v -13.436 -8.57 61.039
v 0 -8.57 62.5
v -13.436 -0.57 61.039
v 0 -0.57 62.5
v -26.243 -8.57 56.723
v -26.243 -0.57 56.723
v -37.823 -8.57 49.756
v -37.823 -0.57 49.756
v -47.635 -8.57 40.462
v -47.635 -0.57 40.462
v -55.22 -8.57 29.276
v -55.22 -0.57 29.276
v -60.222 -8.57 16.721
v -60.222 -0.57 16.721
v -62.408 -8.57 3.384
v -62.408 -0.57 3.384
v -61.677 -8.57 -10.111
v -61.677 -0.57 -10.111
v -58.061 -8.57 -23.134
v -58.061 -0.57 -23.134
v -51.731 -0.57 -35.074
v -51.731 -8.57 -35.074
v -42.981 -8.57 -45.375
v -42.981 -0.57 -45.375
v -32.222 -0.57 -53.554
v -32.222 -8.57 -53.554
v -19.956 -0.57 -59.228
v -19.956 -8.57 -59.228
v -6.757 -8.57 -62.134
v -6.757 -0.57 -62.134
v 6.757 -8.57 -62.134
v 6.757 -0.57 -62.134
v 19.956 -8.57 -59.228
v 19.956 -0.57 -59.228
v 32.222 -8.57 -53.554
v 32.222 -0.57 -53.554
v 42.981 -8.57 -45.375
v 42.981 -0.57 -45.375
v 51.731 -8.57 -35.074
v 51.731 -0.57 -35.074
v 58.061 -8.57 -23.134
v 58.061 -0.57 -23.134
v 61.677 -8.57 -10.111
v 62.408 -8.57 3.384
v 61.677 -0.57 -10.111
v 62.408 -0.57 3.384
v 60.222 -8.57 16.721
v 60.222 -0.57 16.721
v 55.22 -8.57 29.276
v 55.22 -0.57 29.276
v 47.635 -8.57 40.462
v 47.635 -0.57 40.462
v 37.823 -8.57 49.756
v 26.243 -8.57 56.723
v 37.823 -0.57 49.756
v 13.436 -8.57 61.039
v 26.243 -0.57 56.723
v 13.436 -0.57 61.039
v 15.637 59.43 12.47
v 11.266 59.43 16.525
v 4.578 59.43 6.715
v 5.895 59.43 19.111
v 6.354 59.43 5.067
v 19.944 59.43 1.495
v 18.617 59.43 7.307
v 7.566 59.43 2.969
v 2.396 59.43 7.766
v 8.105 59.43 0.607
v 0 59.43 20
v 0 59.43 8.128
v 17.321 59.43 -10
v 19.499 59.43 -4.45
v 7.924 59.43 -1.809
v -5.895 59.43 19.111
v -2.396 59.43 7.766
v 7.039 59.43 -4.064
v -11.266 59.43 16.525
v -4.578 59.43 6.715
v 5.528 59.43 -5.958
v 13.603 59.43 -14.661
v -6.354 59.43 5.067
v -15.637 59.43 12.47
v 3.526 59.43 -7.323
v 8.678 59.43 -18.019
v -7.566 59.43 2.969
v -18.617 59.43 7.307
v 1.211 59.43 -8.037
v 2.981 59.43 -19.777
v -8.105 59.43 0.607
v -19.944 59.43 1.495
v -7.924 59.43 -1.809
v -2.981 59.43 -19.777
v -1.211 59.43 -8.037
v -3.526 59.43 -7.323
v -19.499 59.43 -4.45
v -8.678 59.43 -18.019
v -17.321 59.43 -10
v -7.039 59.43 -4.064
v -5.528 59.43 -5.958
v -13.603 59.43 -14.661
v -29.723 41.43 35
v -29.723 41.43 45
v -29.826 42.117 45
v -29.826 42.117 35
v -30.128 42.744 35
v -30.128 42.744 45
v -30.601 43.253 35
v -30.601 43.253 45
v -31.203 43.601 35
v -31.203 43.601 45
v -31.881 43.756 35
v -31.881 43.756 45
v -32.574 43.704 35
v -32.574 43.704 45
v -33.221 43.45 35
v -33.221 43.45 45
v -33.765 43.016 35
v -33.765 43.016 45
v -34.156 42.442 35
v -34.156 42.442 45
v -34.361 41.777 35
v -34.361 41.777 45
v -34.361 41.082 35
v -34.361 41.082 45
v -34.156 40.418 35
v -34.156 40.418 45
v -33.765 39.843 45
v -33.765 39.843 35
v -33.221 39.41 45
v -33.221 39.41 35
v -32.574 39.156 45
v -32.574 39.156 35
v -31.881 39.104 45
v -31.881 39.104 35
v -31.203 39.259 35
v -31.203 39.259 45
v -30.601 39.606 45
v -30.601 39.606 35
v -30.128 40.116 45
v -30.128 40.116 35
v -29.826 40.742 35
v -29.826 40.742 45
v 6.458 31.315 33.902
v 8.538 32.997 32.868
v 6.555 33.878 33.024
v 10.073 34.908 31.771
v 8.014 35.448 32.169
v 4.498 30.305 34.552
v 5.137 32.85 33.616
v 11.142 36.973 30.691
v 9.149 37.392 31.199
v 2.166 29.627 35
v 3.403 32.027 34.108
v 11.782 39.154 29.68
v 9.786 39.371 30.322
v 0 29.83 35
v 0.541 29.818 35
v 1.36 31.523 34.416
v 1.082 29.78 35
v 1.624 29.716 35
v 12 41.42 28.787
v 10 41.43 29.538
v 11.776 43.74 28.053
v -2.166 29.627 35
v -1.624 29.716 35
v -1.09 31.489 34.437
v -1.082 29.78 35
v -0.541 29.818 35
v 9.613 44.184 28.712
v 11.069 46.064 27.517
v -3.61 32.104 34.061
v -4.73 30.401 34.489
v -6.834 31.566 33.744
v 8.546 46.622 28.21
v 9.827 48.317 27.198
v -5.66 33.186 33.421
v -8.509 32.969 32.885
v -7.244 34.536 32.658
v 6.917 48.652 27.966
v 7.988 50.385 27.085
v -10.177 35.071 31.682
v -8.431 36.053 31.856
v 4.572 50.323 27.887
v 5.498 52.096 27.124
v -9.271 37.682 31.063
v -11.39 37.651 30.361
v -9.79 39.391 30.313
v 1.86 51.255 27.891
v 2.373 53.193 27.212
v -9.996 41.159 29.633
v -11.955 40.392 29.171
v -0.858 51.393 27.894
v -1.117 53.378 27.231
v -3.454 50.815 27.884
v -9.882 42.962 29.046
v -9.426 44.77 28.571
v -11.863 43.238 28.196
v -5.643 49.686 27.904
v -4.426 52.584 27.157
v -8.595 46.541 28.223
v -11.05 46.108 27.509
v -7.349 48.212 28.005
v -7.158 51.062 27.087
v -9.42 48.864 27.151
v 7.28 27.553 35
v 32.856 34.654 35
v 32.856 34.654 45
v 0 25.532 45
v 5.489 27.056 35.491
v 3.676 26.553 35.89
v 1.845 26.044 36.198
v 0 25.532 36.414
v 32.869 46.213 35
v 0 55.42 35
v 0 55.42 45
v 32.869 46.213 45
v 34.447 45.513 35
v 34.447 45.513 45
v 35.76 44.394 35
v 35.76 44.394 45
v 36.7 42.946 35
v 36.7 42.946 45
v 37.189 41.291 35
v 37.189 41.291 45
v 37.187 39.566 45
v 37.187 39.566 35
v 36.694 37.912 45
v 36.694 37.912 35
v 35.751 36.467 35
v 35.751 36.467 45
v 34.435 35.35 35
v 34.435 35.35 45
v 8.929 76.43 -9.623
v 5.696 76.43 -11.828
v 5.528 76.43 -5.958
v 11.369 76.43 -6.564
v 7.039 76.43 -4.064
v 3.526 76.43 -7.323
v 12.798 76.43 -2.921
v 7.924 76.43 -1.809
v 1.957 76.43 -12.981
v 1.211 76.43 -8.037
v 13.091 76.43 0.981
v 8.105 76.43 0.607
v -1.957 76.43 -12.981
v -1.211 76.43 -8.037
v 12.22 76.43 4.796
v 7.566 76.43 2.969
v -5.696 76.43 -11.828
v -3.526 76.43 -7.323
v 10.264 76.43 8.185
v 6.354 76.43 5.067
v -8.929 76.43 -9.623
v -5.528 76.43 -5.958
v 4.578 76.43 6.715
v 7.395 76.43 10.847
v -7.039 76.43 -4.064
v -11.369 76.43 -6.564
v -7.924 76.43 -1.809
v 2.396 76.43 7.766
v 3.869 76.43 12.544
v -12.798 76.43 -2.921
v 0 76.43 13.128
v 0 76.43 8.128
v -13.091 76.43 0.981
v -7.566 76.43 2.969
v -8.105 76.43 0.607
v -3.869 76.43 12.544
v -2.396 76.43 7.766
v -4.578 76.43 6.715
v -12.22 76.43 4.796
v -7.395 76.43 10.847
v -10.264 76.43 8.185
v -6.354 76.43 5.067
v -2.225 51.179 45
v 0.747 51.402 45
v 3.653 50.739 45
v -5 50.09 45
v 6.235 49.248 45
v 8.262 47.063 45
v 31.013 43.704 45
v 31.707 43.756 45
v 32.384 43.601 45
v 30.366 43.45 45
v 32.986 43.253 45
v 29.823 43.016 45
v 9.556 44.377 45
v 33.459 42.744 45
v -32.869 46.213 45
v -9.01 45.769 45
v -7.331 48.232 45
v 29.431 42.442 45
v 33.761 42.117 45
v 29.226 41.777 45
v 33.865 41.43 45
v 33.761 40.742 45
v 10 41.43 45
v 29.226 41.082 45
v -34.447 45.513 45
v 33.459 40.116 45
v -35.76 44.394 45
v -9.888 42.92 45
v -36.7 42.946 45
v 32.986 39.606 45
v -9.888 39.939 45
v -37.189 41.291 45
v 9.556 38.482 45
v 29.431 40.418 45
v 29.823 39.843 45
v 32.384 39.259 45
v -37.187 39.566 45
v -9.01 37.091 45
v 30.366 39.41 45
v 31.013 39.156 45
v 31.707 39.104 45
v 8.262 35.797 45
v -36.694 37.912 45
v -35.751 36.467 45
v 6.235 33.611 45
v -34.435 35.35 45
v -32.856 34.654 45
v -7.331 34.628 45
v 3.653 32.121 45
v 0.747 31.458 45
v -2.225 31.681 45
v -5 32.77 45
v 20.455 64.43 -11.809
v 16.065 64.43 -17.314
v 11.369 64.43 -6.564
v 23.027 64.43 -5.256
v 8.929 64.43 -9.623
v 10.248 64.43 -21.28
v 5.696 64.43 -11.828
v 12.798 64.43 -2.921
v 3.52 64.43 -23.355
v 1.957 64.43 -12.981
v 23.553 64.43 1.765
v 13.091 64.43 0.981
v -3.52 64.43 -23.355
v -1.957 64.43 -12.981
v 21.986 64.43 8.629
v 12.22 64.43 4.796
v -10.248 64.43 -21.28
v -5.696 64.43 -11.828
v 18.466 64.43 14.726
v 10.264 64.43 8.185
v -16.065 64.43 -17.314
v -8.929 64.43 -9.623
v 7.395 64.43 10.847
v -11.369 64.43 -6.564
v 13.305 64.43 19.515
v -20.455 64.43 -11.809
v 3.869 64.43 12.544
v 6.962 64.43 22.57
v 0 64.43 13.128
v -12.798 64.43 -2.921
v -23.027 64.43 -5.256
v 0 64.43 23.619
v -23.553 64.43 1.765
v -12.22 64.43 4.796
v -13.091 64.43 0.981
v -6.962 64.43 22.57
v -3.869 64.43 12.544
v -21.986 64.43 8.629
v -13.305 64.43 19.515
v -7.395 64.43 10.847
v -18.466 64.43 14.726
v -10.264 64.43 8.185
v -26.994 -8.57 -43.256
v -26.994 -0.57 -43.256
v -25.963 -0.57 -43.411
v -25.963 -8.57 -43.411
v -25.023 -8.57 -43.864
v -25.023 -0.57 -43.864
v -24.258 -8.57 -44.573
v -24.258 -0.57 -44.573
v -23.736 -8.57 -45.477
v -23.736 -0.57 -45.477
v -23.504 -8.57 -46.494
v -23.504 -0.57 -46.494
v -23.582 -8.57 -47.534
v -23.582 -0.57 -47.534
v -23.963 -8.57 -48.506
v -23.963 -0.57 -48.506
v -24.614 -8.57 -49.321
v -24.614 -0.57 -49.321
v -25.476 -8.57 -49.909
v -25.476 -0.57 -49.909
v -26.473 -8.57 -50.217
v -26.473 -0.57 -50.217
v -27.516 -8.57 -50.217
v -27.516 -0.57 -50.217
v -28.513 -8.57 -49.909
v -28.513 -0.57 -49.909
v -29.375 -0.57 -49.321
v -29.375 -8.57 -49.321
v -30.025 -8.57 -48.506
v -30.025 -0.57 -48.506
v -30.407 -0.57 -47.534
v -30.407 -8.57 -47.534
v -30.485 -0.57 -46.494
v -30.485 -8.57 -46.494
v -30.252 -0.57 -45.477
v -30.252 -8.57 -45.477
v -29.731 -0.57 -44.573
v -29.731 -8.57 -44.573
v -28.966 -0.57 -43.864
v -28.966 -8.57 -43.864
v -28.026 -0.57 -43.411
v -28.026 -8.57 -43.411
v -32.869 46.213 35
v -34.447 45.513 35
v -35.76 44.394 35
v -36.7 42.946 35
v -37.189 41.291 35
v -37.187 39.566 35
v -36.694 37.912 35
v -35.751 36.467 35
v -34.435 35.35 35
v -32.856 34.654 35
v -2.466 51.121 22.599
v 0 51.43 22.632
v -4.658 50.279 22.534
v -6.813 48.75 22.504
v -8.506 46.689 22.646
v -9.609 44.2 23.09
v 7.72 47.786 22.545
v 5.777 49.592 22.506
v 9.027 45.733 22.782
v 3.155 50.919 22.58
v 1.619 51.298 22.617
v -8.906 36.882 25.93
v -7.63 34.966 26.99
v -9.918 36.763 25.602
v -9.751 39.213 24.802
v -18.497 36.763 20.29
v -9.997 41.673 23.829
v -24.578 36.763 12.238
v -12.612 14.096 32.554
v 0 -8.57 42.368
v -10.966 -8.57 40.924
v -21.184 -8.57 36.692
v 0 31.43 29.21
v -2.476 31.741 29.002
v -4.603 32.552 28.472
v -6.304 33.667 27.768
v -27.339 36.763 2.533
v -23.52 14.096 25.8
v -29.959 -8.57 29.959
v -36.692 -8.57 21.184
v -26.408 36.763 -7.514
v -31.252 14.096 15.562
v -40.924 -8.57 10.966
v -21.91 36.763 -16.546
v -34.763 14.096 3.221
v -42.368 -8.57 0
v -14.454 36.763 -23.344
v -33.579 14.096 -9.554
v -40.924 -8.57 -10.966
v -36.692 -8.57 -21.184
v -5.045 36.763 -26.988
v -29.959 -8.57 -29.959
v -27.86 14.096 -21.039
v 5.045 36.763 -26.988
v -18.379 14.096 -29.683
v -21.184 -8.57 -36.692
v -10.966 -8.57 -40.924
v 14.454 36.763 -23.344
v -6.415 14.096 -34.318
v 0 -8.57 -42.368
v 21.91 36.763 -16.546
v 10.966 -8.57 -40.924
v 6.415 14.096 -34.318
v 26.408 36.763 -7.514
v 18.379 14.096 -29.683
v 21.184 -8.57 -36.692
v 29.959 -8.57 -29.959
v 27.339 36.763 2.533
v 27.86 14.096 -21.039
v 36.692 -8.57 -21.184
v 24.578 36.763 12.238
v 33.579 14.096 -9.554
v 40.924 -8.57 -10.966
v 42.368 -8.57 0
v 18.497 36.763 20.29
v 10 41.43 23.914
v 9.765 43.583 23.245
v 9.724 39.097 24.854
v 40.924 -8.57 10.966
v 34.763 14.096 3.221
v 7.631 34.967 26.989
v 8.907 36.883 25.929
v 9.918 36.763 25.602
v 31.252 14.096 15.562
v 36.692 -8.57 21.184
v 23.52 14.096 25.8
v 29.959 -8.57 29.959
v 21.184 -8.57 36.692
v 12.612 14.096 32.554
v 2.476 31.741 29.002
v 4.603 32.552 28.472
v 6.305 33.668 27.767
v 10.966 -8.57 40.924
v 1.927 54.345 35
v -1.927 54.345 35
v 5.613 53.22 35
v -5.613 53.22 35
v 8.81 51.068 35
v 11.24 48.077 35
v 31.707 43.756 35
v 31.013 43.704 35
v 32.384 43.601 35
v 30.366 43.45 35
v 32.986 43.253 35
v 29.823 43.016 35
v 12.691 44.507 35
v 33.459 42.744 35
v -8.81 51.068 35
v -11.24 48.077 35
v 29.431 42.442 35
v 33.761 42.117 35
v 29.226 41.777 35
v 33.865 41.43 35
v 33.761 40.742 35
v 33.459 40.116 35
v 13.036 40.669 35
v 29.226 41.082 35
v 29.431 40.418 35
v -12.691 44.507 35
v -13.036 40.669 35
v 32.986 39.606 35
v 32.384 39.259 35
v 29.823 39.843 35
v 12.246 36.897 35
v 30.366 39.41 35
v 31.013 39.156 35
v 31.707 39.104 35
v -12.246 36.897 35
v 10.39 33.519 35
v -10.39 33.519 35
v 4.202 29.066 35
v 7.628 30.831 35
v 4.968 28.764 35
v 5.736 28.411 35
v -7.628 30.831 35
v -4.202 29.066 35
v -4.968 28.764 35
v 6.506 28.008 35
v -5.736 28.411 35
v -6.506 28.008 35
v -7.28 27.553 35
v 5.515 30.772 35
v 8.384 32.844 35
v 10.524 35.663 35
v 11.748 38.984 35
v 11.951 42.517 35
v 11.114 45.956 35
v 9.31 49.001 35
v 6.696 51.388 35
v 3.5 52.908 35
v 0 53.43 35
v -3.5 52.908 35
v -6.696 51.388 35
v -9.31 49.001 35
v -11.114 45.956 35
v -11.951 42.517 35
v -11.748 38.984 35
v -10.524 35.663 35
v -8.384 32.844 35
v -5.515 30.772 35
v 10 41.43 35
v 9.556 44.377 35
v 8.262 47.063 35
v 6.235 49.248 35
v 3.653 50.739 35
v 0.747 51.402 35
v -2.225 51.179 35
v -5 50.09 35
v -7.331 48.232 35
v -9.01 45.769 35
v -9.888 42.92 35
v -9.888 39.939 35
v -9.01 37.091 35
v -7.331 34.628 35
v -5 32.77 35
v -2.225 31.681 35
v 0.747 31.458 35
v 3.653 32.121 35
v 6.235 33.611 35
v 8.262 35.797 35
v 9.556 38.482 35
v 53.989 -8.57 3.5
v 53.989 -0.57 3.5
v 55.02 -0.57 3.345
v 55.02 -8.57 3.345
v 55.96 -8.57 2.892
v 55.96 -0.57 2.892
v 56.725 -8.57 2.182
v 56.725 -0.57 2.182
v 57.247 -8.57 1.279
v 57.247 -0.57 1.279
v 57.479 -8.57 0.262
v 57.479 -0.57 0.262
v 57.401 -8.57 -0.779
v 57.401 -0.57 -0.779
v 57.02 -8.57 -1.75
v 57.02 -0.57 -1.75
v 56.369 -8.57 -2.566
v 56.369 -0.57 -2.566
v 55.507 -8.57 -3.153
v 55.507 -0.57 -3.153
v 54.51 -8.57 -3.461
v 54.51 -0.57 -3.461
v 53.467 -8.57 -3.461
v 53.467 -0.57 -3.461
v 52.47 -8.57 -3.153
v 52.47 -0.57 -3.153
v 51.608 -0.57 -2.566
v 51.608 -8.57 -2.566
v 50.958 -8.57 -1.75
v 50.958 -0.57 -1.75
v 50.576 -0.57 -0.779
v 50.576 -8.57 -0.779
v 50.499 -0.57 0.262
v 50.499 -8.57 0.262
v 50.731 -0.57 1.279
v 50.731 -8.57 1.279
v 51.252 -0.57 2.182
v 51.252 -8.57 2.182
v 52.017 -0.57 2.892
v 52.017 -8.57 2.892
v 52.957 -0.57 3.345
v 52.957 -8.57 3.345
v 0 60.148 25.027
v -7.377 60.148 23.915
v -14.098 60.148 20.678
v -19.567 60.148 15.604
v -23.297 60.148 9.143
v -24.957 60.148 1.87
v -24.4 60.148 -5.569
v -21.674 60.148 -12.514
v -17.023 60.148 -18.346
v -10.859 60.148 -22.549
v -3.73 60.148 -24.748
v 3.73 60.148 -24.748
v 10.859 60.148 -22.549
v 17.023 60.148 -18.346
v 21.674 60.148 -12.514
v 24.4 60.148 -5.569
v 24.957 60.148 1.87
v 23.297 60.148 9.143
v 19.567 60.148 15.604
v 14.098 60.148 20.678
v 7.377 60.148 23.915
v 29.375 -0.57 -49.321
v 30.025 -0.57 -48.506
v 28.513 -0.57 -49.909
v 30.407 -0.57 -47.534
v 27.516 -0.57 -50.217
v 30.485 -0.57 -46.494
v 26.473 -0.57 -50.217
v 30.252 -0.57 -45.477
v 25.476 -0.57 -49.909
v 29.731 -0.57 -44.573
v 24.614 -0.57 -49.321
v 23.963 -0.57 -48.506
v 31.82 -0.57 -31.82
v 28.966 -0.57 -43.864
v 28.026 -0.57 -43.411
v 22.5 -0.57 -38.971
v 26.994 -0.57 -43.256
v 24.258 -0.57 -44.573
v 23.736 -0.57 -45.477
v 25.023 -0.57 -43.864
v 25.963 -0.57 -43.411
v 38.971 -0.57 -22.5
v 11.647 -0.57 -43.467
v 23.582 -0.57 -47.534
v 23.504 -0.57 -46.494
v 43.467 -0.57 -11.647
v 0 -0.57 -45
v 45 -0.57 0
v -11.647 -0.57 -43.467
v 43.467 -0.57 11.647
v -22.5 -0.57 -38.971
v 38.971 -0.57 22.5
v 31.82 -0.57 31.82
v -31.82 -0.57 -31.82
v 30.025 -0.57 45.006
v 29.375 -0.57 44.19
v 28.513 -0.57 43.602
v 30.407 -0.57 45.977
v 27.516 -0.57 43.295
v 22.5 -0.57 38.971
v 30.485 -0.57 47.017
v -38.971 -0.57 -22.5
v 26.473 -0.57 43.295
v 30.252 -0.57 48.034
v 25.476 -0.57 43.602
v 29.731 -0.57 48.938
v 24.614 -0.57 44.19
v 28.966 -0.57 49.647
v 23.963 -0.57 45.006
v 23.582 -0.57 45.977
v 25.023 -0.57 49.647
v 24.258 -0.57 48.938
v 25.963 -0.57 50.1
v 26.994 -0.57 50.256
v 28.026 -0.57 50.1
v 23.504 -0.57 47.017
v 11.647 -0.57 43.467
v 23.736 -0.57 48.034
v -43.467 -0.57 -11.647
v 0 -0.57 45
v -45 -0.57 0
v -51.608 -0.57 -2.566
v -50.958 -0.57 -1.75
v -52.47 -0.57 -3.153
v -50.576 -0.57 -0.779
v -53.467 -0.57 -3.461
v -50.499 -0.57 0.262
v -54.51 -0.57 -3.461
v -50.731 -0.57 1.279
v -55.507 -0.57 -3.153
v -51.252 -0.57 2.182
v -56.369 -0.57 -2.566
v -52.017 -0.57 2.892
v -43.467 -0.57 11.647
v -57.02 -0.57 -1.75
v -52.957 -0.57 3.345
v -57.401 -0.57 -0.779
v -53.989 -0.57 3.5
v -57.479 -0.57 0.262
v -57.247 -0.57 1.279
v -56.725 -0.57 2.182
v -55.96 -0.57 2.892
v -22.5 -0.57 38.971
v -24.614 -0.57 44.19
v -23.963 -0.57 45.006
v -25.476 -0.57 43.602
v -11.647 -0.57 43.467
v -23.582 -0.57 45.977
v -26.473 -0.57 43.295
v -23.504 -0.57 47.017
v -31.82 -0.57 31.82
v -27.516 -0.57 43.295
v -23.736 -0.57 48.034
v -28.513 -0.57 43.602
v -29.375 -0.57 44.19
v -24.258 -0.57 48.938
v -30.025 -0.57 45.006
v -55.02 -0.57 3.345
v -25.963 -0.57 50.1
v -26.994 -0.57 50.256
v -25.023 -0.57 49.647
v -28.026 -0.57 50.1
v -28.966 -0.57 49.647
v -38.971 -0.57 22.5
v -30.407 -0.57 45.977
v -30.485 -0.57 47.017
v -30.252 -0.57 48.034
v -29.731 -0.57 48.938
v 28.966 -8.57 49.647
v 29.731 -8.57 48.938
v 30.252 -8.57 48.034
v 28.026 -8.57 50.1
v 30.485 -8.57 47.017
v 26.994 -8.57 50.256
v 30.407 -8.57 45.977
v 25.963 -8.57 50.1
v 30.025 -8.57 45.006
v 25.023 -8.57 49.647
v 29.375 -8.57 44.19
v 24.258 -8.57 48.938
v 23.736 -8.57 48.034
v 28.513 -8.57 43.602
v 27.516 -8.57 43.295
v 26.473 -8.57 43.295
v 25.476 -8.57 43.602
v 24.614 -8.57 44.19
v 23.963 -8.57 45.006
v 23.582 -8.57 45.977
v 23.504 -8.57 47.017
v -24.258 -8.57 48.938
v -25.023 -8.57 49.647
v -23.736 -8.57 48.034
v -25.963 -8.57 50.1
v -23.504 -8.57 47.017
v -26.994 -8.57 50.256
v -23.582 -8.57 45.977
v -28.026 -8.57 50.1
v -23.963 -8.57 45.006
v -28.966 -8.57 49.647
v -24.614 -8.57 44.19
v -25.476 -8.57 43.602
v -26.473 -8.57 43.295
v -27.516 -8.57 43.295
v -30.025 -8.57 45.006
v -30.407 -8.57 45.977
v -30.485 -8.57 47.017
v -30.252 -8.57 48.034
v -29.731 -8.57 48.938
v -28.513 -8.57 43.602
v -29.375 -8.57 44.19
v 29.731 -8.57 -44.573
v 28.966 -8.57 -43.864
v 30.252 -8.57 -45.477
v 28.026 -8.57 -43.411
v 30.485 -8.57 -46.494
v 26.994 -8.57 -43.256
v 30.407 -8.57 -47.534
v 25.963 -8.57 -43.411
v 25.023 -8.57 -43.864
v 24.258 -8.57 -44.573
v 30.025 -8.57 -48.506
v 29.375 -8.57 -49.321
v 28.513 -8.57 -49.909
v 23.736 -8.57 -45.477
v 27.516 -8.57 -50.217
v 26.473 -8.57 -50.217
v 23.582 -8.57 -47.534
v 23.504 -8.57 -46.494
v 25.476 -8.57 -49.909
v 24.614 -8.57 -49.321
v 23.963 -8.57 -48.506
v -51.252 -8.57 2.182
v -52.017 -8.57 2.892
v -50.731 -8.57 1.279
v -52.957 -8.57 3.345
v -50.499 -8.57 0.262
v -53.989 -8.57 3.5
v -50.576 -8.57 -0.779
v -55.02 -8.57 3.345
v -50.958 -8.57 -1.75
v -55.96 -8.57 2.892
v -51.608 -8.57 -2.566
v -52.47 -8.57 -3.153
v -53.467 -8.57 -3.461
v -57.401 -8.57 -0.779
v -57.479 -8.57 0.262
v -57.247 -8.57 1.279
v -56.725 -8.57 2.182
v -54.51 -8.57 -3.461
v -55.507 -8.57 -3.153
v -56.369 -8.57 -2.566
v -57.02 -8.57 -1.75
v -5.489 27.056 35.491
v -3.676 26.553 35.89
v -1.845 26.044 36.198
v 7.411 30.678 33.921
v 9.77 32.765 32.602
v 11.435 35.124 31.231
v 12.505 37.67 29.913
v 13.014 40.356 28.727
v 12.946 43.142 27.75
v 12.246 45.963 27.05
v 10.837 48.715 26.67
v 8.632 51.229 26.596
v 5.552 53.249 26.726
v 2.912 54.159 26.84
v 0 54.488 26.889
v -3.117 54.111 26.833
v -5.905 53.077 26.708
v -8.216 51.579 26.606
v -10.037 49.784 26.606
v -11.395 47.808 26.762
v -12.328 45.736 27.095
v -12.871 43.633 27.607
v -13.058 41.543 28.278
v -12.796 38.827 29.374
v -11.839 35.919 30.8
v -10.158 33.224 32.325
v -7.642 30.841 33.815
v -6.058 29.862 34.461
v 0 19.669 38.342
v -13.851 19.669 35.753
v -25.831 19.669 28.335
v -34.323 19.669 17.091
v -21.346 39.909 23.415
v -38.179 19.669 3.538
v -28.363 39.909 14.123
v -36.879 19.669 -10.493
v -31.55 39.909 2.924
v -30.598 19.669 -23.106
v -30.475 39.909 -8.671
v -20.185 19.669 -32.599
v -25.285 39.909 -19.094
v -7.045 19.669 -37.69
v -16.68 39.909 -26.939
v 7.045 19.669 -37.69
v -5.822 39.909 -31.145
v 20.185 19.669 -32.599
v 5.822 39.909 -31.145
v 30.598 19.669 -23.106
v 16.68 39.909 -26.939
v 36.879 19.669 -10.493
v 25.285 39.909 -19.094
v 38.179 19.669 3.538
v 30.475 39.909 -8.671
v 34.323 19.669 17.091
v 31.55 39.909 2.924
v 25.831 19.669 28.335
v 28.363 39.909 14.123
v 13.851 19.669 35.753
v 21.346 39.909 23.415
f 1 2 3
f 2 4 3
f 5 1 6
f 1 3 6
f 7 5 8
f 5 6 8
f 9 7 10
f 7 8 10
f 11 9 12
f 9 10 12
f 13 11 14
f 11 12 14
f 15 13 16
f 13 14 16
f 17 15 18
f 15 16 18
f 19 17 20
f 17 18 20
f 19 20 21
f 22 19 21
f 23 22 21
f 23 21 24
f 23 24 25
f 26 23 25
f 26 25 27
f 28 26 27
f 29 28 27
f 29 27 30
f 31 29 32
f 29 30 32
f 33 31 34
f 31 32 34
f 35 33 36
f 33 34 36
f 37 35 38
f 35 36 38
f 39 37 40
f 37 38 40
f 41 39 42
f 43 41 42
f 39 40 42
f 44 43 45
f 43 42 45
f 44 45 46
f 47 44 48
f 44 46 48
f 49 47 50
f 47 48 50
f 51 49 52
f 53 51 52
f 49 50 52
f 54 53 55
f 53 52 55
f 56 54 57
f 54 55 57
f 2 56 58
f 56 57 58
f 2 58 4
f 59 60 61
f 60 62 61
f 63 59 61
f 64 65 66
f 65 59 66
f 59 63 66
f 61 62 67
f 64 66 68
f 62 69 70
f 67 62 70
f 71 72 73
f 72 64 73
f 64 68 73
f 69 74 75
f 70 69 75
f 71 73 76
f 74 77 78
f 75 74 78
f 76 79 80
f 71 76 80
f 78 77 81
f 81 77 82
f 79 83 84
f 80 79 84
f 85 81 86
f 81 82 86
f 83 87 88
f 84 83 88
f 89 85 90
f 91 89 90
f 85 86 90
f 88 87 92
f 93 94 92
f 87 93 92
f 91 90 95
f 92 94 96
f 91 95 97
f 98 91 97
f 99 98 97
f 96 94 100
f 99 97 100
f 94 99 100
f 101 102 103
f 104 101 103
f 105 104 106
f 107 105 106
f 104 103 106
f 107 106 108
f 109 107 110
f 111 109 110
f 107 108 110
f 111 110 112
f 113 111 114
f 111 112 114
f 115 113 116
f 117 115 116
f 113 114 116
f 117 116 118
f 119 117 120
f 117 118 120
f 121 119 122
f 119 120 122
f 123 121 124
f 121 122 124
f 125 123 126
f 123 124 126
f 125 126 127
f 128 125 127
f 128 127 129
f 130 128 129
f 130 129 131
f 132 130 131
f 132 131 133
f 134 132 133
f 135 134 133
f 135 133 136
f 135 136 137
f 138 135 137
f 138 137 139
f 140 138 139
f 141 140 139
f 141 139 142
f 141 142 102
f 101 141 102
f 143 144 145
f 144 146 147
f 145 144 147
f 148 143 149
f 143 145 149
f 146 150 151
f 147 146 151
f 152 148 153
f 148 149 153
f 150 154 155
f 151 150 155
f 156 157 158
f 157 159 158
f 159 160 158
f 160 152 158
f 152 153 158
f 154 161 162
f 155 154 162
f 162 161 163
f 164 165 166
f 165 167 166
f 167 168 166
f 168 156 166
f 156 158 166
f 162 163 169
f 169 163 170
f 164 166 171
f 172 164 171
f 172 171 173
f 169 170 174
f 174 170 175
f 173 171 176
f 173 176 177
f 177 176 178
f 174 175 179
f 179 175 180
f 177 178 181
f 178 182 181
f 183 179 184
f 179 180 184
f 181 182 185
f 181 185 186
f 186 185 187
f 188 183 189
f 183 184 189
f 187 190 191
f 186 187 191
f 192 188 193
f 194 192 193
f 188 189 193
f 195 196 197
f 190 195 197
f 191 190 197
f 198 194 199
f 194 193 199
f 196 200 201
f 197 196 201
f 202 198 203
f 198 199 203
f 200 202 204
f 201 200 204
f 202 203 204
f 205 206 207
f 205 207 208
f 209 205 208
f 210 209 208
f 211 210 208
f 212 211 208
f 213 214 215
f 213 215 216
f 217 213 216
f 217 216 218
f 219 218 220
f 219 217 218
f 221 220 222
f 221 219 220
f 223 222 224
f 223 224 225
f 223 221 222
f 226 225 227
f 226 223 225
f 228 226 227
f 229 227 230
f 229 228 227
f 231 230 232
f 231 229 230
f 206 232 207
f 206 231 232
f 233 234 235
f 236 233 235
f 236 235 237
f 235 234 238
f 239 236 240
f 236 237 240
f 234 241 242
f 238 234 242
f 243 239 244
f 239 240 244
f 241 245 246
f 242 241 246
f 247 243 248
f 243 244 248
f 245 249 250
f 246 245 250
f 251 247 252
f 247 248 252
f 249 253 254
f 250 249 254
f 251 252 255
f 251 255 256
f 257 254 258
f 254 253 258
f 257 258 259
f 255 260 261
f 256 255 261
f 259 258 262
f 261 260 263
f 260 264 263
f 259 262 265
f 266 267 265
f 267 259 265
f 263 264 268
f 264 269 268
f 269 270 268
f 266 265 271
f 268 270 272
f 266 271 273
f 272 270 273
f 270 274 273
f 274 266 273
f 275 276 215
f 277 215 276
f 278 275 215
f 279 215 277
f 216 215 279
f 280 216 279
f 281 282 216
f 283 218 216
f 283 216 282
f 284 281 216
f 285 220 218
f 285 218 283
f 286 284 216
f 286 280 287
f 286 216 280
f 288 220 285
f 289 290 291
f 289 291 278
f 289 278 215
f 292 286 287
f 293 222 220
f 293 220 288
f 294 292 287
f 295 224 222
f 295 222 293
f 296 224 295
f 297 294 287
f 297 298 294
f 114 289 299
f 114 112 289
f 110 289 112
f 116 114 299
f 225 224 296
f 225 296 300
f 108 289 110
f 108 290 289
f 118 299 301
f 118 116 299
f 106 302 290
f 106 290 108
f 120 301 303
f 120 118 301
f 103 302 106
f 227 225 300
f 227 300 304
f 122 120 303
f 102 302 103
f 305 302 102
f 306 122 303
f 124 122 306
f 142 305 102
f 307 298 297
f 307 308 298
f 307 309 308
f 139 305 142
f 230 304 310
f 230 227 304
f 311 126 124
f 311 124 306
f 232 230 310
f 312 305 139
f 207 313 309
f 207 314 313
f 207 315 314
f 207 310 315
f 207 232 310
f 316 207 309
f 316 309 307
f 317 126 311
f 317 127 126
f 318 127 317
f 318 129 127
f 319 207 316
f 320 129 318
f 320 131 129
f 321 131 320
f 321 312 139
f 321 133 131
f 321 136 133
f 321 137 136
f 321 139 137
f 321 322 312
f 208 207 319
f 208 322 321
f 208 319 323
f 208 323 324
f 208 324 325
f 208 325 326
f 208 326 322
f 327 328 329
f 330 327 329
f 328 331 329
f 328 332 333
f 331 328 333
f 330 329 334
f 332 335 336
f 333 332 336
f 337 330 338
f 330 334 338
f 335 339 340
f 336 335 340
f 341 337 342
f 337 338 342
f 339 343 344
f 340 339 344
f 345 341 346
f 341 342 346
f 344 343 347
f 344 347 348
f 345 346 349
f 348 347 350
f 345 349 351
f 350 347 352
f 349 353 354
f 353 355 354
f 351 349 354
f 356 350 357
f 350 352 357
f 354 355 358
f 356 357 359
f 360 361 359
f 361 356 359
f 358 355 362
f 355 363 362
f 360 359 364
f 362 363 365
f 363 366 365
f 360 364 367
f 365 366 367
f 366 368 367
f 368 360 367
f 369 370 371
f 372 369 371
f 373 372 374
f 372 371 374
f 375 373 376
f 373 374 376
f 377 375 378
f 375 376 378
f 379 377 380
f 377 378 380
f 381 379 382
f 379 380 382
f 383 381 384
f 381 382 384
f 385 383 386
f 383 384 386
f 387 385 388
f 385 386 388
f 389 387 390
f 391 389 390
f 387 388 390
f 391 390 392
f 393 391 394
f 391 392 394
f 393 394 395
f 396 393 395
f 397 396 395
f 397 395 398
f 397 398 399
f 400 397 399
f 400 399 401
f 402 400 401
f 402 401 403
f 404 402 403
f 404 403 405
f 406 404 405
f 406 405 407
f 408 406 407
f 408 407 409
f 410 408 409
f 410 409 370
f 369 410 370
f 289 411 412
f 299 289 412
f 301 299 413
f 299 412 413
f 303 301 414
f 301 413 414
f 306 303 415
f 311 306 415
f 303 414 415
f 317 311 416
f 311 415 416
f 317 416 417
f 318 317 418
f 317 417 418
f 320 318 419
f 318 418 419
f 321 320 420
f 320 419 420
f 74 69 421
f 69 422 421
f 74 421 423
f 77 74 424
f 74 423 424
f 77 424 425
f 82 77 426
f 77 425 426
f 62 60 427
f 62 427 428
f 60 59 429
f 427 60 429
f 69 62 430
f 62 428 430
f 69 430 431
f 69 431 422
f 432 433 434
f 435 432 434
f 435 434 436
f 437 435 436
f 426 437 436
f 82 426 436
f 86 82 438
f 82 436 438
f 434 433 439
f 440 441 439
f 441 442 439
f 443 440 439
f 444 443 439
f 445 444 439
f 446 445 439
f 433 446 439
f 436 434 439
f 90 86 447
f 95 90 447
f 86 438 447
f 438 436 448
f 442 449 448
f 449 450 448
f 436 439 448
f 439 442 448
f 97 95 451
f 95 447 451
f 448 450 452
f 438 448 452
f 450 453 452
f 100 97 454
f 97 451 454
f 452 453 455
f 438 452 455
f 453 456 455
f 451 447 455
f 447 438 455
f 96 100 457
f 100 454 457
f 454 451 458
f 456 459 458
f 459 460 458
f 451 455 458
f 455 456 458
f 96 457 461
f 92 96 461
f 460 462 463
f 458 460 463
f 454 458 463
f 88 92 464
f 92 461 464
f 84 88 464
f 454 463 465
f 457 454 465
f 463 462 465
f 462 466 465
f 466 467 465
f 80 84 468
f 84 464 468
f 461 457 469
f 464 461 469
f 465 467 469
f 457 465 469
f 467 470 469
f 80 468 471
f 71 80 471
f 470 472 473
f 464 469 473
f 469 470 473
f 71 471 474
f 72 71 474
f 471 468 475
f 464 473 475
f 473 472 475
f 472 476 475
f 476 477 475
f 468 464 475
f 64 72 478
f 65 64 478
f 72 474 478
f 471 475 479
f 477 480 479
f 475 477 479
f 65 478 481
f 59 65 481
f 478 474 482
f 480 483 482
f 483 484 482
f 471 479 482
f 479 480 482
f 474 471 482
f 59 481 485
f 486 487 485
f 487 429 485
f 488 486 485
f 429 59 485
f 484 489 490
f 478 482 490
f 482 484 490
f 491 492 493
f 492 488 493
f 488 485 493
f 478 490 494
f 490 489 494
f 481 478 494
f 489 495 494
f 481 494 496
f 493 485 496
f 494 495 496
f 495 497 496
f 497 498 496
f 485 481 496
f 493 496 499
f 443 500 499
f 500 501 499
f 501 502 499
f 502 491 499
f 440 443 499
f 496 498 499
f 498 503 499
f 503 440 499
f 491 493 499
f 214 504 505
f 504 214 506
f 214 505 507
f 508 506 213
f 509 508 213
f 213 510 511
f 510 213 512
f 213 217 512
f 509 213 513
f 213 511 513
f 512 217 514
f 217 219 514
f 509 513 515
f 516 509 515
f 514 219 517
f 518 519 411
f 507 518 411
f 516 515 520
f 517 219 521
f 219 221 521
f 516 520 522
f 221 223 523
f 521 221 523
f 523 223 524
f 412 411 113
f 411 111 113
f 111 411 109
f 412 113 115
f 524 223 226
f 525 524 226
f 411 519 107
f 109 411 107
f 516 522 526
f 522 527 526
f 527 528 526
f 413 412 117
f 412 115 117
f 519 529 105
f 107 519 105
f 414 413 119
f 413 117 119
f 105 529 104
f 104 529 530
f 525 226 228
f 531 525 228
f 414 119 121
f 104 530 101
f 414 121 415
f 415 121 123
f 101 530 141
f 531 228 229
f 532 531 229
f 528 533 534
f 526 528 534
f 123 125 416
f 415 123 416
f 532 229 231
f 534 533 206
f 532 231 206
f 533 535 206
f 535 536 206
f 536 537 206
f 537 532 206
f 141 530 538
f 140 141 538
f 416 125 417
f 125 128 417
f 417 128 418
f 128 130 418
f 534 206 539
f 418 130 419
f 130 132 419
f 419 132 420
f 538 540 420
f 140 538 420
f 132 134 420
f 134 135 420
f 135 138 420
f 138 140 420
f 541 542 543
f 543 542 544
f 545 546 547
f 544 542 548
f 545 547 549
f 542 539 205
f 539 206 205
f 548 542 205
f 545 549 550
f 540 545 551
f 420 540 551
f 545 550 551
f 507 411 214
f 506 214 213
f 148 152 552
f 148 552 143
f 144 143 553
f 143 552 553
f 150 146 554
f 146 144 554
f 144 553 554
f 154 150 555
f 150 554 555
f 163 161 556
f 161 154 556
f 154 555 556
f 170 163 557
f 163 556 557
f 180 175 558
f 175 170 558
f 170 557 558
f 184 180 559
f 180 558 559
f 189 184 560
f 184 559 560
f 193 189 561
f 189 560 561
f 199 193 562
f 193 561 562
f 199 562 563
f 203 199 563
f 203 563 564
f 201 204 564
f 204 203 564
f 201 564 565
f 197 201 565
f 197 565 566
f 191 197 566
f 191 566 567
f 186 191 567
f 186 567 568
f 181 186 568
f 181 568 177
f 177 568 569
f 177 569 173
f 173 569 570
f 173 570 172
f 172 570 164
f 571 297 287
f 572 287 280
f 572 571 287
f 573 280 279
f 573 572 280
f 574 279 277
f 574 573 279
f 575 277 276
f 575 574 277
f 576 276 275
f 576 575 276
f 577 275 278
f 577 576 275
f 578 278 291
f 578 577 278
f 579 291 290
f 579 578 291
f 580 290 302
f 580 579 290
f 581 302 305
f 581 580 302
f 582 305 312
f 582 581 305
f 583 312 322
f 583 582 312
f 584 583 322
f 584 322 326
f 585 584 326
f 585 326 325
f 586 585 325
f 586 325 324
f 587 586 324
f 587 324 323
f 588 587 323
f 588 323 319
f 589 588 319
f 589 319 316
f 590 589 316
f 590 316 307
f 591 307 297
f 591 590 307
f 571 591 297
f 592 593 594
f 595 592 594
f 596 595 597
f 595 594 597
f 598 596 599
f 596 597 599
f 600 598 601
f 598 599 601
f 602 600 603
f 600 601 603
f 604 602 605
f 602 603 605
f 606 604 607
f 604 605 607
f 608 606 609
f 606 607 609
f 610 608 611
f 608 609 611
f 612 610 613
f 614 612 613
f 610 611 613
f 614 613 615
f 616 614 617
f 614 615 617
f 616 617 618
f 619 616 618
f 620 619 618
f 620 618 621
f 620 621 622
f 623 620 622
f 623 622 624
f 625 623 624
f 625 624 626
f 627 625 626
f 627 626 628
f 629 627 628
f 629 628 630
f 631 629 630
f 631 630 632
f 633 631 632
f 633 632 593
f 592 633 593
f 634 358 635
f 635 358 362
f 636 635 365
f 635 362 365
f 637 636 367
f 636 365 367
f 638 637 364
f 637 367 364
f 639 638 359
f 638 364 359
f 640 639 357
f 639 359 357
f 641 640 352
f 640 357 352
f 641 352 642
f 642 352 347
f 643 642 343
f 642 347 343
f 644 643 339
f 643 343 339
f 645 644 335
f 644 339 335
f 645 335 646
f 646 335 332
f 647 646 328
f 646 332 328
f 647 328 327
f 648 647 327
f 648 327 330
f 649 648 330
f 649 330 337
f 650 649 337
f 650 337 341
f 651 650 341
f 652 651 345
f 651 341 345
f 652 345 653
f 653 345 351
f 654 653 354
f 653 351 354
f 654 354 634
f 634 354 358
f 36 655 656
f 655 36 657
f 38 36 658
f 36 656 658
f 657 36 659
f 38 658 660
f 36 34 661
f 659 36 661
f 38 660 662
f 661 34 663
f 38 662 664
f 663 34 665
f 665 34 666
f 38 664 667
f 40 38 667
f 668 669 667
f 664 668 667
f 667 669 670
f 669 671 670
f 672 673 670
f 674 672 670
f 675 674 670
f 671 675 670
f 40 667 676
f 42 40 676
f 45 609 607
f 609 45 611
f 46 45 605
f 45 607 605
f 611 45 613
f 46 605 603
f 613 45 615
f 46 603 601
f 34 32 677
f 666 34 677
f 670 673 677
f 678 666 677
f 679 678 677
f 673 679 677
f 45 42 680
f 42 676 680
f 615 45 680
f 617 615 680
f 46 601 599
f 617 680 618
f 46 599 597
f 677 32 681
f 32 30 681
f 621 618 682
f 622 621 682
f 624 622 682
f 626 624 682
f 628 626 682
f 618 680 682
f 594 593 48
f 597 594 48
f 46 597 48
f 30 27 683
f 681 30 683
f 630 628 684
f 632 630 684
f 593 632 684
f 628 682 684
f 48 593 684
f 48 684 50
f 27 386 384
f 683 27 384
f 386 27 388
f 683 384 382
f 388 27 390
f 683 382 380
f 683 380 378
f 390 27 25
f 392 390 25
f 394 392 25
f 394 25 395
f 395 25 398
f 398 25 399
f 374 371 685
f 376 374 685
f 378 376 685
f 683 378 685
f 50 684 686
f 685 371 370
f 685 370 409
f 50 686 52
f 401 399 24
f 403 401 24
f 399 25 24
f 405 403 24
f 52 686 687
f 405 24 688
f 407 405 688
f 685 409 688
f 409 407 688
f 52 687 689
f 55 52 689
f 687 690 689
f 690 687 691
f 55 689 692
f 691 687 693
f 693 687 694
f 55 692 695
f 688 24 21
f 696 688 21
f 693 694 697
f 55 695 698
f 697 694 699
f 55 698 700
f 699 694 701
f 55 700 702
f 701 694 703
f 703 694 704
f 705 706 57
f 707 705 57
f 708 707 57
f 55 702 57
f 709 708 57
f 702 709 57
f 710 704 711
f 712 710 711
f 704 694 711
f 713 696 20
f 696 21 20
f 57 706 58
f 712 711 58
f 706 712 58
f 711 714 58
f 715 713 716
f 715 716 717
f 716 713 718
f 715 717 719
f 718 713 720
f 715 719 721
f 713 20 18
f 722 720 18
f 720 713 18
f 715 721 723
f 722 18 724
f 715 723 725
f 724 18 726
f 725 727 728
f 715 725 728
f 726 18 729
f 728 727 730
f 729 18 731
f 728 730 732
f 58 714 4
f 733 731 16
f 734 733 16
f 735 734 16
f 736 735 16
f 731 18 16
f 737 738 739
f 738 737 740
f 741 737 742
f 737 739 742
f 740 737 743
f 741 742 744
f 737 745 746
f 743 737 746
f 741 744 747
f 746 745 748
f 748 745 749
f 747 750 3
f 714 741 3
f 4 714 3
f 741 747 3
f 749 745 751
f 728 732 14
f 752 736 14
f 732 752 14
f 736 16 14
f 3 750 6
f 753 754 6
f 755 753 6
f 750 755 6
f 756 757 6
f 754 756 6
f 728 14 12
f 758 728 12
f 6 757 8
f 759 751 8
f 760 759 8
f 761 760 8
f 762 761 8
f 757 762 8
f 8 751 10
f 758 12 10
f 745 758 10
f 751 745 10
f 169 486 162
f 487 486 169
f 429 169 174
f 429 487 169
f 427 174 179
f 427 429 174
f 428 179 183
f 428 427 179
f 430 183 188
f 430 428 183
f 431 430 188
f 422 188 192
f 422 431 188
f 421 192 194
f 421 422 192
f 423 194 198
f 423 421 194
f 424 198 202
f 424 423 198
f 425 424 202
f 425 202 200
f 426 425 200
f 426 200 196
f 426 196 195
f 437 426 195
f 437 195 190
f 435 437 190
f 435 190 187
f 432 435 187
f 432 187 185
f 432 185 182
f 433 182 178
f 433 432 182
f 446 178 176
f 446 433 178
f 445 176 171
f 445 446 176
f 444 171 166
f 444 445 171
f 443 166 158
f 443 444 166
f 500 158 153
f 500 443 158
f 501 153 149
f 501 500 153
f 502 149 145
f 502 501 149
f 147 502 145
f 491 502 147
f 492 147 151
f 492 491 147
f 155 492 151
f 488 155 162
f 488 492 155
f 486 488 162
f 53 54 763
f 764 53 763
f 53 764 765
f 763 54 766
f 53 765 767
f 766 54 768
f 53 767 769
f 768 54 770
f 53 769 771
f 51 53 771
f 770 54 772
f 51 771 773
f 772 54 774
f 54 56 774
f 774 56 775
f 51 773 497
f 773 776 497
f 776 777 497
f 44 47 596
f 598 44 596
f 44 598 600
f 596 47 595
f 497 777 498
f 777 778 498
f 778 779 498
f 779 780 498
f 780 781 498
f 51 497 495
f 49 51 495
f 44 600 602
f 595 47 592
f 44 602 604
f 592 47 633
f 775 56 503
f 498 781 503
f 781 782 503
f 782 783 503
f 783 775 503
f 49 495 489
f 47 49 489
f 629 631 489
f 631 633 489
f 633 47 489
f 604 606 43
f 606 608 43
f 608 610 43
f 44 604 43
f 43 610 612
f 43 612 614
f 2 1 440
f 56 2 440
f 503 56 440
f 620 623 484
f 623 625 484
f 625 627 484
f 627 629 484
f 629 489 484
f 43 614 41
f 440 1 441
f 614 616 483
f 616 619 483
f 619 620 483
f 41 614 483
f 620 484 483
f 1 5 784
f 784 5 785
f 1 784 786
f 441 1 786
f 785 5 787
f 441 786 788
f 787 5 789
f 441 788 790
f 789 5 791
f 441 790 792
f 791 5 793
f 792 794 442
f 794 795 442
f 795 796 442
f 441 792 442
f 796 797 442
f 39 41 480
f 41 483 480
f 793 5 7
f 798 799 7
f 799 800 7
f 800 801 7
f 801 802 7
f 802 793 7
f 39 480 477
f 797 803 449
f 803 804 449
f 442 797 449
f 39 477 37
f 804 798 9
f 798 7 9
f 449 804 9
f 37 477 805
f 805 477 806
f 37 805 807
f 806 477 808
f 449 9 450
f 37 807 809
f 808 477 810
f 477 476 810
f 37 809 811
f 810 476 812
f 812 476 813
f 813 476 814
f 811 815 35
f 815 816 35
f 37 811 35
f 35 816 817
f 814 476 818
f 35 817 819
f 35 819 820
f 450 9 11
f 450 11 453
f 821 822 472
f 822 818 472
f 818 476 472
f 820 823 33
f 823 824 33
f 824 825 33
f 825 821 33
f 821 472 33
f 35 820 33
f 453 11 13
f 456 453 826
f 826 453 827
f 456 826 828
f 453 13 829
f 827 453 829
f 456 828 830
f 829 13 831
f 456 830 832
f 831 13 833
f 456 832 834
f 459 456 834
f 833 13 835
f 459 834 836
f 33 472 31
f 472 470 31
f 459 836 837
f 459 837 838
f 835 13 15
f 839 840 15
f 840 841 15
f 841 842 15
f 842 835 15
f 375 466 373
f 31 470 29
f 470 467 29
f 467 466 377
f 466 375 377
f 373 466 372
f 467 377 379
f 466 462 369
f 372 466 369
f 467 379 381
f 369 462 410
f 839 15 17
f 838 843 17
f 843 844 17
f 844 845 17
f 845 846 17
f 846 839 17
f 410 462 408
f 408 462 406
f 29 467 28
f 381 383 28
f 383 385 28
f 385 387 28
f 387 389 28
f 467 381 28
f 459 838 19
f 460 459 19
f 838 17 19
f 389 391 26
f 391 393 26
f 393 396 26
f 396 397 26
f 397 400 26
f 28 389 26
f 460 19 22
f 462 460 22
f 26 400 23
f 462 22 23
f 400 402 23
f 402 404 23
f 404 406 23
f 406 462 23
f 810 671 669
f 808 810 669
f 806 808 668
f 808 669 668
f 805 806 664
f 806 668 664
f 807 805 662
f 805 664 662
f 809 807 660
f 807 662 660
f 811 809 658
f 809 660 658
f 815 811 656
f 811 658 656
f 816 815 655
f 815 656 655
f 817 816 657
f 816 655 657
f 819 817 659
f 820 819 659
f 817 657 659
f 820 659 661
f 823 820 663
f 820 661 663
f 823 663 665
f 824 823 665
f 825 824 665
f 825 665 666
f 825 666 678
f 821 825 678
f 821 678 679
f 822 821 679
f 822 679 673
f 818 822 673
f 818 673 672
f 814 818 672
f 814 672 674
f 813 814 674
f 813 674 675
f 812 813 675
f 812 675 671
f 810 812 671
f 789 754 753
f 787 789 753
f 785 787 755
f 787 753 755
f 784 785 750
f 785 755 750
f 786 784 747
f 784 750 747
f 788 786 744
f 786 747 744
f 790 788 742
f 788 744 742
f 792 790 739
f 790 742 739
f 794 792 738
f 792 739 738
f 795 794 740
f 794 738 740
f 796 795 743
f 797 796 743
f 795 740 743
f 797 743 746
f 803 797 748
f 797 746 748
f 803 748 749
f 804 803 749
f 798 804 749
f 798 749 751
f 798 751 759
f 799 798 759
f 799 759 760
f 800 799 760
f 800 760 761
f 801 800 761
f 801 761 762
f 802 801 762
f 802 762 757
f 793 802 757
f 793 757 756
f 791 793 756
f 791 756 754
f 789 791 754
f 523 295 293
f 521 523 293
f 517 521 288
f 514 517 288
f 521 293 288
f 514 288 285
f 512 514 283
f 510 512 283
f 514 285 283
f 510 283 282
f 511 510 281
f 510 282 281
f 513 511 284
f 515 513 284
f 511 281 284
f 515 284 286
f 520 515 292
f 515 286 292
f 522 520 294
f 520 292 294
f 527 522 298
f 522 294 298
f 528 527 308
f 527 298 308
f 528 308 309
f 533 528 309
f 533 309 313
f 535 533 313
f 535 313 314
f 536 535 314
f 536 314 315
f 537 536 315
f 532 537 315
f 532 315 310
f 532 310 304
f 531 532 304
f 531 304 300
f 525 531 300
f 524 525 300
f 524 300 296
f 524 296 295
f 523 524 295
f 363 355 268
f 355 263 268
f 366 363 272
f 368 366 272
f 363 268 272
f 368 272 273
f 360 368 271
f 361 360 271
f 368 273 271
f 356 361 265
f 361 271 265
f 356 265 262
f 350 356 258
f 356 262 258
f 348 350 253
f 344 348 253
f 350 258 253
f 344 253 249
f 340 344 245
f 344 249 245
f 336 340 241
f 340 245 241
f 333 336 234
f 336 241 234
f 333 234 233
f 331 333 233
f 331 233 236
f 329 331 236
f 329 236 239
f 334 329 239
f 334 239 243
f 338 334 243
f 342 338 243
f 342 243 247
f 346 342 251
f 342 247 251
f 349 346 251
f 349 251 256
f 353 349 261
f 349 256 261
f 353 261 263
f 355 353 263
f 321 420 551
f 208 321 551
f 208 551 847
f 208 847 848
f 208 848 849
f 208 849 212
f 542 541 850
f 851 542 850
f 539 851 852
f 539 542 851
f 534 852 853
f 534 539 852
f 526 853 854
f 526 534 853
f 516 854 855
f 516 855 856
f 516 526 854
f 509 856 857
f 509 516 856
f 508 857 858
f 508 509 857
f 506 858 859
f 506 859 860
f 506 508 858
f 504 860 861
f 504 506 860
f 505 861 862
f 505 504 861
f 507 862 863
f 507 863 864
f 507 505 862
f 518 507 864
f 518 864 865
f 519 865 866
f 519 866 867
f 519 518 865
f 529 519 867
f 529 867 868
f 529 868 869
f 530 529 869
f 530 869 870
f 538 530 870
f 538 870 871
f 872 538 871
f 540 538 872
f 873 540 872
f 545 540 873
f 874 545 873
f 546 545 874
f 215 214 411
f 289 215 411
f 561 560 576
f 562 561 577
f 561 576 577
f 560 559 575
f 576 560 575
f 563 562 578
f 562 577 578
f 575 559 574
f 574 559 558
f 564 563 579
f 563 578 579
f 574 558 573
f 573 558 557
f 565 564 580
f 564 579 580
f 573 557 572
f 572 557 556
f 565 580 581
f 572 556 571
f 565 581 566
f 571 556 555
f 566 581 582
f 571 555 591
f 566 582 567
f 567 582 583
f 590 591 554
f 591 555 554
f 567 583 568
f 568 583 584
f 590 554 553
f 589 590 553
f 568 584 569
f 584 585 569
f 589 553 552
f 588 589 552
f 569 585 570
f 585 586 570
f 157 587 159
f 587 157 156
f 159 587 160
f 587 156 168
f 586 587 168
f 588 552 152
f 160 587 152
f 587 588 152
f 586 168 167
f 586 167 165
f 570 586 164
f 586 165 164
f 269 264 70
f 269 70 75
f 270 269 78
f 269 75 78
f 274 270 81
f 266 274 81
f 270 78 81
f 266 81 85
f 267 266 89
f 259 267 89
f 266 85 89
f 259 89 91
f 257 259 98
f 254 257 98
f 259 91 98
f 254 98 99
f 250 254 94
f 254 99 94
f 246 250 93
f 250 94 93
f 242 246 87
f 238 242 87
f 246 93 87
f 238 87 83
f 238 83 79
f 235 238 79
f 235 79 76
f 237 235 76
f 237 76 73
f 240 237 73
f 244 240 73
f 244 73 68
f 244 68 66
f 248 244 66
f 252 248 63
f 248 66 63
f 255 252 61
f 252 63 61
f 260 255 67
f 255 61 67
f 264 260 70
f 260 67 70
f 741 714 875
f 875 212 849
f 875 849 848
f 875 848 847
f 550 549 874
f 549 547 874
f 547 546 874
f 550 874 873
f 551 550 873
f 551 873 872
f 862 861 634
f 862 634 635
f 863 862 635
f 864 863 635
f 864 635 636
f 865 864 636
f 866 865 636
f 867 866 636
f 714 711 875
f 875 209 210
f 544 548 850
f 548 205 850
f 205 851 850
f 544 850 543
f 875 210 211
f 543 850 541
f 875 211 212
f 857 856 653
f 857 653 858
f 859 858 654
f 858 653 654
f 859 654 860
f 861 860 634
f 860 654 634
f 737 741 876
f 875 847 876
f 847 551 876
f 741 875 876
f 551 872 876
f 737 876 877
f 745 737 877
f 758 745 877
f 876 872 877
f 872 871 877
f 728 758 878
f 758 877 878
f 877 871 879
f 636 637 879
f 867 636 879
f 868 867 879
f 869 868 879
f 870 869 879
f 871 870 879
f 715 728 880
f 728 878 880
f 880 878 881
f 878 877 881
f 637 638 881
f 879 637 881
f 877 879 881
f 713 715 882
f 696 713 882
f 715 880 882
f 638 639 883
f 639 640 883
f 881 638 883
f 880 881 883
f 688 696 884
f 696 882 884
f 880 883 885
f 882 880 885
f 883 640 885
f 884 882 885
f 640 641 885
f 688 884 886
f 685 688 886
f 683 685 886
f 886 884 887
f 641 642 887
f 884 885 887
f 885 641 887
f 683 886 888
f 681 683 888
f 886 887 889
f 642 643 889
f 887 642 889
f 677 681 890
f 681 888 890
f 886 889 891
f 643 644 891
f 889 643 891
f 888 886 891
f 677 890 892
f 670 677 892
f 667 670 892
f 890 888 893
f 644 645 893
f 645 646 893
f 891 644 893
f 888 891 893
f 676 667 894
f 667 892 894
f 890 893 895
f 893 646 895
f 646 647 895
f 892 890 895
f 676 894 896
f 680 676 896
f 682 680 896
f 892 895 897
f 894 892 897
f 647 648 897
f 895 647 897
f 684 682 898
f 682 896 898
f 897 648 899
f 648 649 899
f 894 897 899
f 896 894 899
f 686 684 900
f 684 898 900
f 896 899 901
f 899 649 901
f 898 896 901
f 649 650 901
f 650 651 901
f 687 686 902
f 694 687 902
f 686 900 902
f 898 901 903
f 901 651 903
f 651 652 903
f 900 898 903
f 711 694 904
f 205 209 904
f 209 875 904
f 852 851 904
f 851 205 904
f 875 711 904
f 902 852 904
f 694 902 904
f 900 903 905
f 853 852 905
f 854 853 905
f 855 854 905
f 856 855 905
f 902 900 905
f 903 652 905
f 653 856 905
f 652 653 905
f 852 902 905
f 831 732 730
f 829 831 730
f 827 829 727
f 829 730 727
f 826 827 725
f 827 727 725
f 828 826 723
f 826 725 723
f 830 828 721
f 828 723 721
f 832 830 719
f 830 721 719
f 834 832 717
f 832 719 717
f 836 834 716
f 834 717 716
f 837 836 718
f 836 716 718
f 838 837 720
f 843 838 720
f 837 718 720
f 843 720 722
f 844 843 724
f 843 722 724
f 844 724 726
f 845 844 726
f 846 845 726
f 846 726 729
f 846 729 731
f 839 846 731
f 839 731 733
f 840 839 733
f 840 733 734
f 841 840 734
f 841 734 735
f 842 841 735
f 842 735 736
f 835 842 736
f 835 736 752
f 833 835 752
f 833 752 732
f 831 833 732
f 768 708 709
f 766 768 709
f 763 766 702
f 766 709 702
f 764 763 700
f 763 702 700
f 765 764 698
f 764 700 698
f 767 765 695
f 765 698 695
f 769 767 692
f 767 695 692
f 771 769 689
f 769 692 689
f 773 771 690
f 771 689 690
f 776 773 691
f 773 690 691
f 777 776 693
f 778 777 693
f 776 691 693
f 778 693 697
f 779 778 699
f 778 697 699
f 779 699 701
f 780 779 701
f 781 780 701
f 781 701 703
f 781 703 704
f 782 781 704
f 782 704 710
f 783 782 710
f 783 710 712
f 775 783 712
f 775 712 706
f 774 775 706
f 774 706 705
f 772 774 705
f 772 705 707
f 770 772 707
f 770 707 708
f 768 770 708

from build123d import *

# Parameters (mm, degrees)
SKETCH_2_R                      = 10
EXTRUDE_2_DEPTH                 = 45
EXTRUDE_START                   = -10
SKETCH_4_R                      = 10
EXTRUDE_4_DEPTH                 = 10
SKETCH_2_2_R                    = 10
CUT_EXTRUDE_1_DEPTH             = 117.85038305
EXTRUDE_5_REACH                 = 147.959
SKETCH_5_R                      = 13.058341014
SKETCH_5_R_2                    = 12
CUT_EXTRUDE_2_REACH             = 147.959
SKETCH_8_R                      = 2.33230382
CUT_EXTRUDE_2_DIRECTION_2_DEPTH = 146.958939497
CUT_EXTRUDE_3_REACH             = 118.85
SKETCH_9_R                      = 3.5


with BuildPart() as part:
    # 草图1 → 旋转1 (revolve)
    with BuildSketch(Plane.XY, mode=Mode.PRIVATE) as revolve_1_sk:
        Polygon((-8.127581033, 76.429784894), (-8.127581033, 59.429784894), (-20, 59.429784894), (-42.367966888, -8.570215106), (-62.5, -8.570215106), (-62.5, -0.570215106), (-45, -0.570215106), (-25.027243731, 60.148196767), (-23.61885518, 64.429784894), (-13.127581033, 64.429784894), (-13.127581033, 76.429784894), align=None)
    revolve(revolve_1_sk.sketch.rotate(Axis((0, 0, 0), (0, -1, 0)), 270), axis=Axis((0, 0, 0), (0, -1, 0)))

    # 草图2 → 凸台-拉伸2 (add)
    with BuildSketch(Plane.XY):
        with Locations(Location((0, 41.429784894, 0), (0, 0, 221.869851272))):
            Circle(SKETCH_2_R)
    extrude(amount=EXTRUDE_2_DEPTH)

    # 草图4 → 凸台-拉伸4 (add)
    with BuildSketch(Plane.XY.offset(45).offset(EXTRUDE_START)):
        with Locations(Location((0, 41.429784894, 0), (0, 0, 221.869851272))):
            Circle(SKETCH_4_R)
        with BuildLine():
            Line((0, 55.419685687), (-32.868994798, 46.212925364))
            ThreePointArc((-32.868994798, 46.212925364), (-37.250650309, 40.428422584), (-32.855748679, 34.653977409))
            Line((-32.855748679, 34.653977409), (0, 25.532086459))
            Line((0, 25.532086459), (0, 41.429784894))
            Line((0, 41.429784894), (0, 55.419685687))
        make_face()
        with BuildLine():
            ThreePointArc((32.868994798, 46.212925364), (37.250650309, 40.428422584), (32.855748679, 34.653977409))
            Line((32.855748679, 34.653977409), (0, 25.532086459))
            Line((0, 25.532086459), (0, 41.429784894))
            Line((0, 41.429784894), (0, 55.419685687))
            Line((0, 55.419685687), (32.868994798, 46.212925364))
        make_face()
    extrude(amount=EXTRUDE_4_DEPTH)

    # 草图2<2> → 切除-拉伸1 (cut, through all)
    with BuildSketch(Plane.XY):
        with Locations((0, 41.429784894)):
            Circle(SKETCH_2_2_R)
    extrude(amount=CUT_EXTRUDE_1_DEPTH, mode=Mode.SUBTRACT)

    # 草图5 → 凸台-拉伸5 (add, up to next)
    with BuildSketch(Plane.XY.offset(45), mode=Mode.PRIVATE) as extrude_5_sk1:
        with Locations((0, 41.429784894)):
            Circle(SKETCH_5_R)
        with Locations((0, 41.429784894)):
            Circle(SKETCH_5_R_2, mode=Mode.SUBTRACT)
    extrude_5_tool1 = extrude(extrude_5_sk1.sketch, amount=-EXTRUDE_5_REACH, mode=Mode.PRIVATE) - part.part
    add(extrude_5_tool1.solids().sort_by_distance((-12.688995, 41.429785, 45))[0])

    # 草图8 → 切除-拉伸2 (cut, up to next)
    with BuildSketch(Plane.XY.offset(45), mode=Mode.PRIVATE) as cut_extrude_2_sk1:
        with Locations((-32.054895546, 41.429784894)):
            Circle(SKETCH_8_R)
    cut_extrude_2_tool1 = extrude(cut_extrude_2_sk1.sketch, amount=-CUT_EXTRUDE_2_REACH, mode=Mode.PRIVATE) & part.part
    # 草图8 → 切除-拉伸2 (cut, up to next)
    with BuildSketch(Plane.XY.offset(45), mode=Mode.PRIVATE) as cut_extrude_2_sk2:
        with Locations((31.532261379, 41.429784894)):
            Circle(SKETCH_8_R)
    cut_extrude_2_tool2 = extrude(cut_extrude_2_sk2.sketch, amount=-CUT_EXTRUDE_2_REACH, mode=Mode.PRIVATE) & part.part
    add(cut_extrude_2_tool1.solids().sort_by_distance((-32.054896, 41.429785, 45))[0], mode=Mode.SUBTRACT)
    add(cut_extrude_2_tool2.solids().sort_by_distance((31.532261, 41.429785, 45))[0], mode=Mode.SUBTRACT)

    # 草图8 → 切除-拉伸2 direction 2 (cut)
    with BuildSketch(Plane.XY.offset(45)):
        with Locations((-32.054895546, 41.429784894)):
            Circle(SKETCH_8_R)
        with Locations((31.532261379, 41.429784894)):
            Circle(SKETCH_8_R)
    extrude(amount=CUT_EXTRUDE_2_DIRECTION_2_DEPTH, mode=Mode.SUBTRACT)

    # 草图9 → 切除-拉伸3 (cut, up to next)
    with BuildSketch(Plane(origin=(0, 0, 0), x_dir=(1, 0, 0), z_dir=(0, 1, 0)), mode=Mode.PRIVATE) as cut_extrude_3_sk1:
        with Locations(Location((-53.988745261, 0, 0), (0, 0, 270))):
            Circle(SKETCH_9_R)
    cut_extrude_3_tool1 = extrude(cut_extrude_3_sk1.sketch, amount=-CUT_EXTRUDE_3_REACH, mode=Mode.PRIVATE) & part.part
    # 草图9 → 切除-拉伸3 (cut, up to next)
    with BuildSketch(Plane(origin=(0, 0, 0), x_dir=(1, 0, 0), z_dir=(0, 1, 0)), mode=Mode.PRIVATE) as cut_extrude_3_sk2:
        with Locations(Location((-26.994372631, 46.755624915, 0), (0, 0, 270))):
            Circle(SKETCH_9_R)
    cut_extrude_3_tool2 = extrude(cut_extrude_3_sk2.sketch, amount=-CUT_EXTRUDE_3_REACH, mode=Mode.PRIVATE) & part.part
    # 草图9 → 切除-拉伸3 (cut, up to next)
    with BuildSketch(Plane(origin=(0, 0, 0), x_dir=(1, 0, 0), z_dir=(0, 1, 0)), mode=Mode.PRIVATE) as cut_extrude_3_sk3:
        with Locations(Location((26.994372631, 46.755624915, 0), (0, 0, 270))):
            Circle(SKETCH_9_R)
    cut_extrude_3_tool3 = extrude(cut_extrude_3_sk3.sketch, amount=-CUT_EXTRUDE_3_REACH, mode=Mode.PRIVATE) & part.part
    # 草图9 → 切除-拉伸3 (cut, up to next)
    with BuildSketch(Plane(origin=(0, 0, 0), x_dir=(1, 0, 0), z_dir=(0, 1, 0)), mode=Mode.PRIVATE) as cut_extrude_3_sk4:
        with Locations(Location((53.988745261, 0, 0), (0, 0, 270))):
            Circle(SKETCH_9_R)
    cut_extrude_3_tool4 = extrude(cut_extrude_3_sk4.sketch, amount=-CUT_EXTRUDE_3_REACH, mode=Mode.PRIVATE) & part.part
    # 草图9 → 切除-拉伸3 (cut, up to next)
    with BuildSketch(Plane(origin=(0, 0, 0), x_dir=(1, 0, 0), z_dir=(0, 1, 0)), mode=Mode.PRIVATE) as cut_extrude_3_sk5:
        with Locations(Location((26.994372631, -46.755624915, 0), (0, 0, 270))):
            Circle(SKETCH_9_R)
    cut_extrude_3_tool5 = extrude(cut_extrude_3_sk5.sketch, amount=-CUT_EXTRUDE_3_REACH, mode=Mode.PRIVATE) & part.part
    # 草图9 → 切除-拉伸3 (cut, up to next)
    with BuildSketch(Plane(origin=(0, 0, 0), x_dir=(1, 0, 0), z_dir=(0, 1, 0)), mode=Mode.PRIVATE) as cut_extrude_3_sk6:
        with Locations(Location((-26.994372631, -46.755624915, 0), (0, 0, 270))):
            Circle(SKETCH_9_R)
    cut_extrude_3_tool6 = extrude(cut_extrude_3_sk6.sketch, amount=-CUT_EXTRUDE_3_REACH, mode=Mode.PRIVATE) & part.part
    add(cut_extrude_3_tool1.solids().sort_by_distance((-53.988745, 0, 0))[0], mode=Mode.SUBTRACT)
    add(cut_extrude_3_tool2.solids().sort_by_distance((-26.994373, 0, -46.755625))[0], mode=Mode.SUBTRACT)
    add(cut_extrude_3_tool3.solids().sort_by_distance((26.994373, 0, -46.755625))[0], mode=Mode.SUBTRACT)
    add(cut_extrude_3_tool4.solids().sort_by_distance((53.988745, 0, 0))[0], mode=Mode.SUBTRACT)
    add(cut_extrude_3_tool5.solids().sort_by_distance((26.994373, 0, 46.755625))[0], mode=Mode.SUBTRACT)
    add(cut_extrude_3_tool6.solids().sort_by_distance((-26.994373, 0, 46.755625))[0], mode=Mode.SUBTRACT)


solid = part.part
